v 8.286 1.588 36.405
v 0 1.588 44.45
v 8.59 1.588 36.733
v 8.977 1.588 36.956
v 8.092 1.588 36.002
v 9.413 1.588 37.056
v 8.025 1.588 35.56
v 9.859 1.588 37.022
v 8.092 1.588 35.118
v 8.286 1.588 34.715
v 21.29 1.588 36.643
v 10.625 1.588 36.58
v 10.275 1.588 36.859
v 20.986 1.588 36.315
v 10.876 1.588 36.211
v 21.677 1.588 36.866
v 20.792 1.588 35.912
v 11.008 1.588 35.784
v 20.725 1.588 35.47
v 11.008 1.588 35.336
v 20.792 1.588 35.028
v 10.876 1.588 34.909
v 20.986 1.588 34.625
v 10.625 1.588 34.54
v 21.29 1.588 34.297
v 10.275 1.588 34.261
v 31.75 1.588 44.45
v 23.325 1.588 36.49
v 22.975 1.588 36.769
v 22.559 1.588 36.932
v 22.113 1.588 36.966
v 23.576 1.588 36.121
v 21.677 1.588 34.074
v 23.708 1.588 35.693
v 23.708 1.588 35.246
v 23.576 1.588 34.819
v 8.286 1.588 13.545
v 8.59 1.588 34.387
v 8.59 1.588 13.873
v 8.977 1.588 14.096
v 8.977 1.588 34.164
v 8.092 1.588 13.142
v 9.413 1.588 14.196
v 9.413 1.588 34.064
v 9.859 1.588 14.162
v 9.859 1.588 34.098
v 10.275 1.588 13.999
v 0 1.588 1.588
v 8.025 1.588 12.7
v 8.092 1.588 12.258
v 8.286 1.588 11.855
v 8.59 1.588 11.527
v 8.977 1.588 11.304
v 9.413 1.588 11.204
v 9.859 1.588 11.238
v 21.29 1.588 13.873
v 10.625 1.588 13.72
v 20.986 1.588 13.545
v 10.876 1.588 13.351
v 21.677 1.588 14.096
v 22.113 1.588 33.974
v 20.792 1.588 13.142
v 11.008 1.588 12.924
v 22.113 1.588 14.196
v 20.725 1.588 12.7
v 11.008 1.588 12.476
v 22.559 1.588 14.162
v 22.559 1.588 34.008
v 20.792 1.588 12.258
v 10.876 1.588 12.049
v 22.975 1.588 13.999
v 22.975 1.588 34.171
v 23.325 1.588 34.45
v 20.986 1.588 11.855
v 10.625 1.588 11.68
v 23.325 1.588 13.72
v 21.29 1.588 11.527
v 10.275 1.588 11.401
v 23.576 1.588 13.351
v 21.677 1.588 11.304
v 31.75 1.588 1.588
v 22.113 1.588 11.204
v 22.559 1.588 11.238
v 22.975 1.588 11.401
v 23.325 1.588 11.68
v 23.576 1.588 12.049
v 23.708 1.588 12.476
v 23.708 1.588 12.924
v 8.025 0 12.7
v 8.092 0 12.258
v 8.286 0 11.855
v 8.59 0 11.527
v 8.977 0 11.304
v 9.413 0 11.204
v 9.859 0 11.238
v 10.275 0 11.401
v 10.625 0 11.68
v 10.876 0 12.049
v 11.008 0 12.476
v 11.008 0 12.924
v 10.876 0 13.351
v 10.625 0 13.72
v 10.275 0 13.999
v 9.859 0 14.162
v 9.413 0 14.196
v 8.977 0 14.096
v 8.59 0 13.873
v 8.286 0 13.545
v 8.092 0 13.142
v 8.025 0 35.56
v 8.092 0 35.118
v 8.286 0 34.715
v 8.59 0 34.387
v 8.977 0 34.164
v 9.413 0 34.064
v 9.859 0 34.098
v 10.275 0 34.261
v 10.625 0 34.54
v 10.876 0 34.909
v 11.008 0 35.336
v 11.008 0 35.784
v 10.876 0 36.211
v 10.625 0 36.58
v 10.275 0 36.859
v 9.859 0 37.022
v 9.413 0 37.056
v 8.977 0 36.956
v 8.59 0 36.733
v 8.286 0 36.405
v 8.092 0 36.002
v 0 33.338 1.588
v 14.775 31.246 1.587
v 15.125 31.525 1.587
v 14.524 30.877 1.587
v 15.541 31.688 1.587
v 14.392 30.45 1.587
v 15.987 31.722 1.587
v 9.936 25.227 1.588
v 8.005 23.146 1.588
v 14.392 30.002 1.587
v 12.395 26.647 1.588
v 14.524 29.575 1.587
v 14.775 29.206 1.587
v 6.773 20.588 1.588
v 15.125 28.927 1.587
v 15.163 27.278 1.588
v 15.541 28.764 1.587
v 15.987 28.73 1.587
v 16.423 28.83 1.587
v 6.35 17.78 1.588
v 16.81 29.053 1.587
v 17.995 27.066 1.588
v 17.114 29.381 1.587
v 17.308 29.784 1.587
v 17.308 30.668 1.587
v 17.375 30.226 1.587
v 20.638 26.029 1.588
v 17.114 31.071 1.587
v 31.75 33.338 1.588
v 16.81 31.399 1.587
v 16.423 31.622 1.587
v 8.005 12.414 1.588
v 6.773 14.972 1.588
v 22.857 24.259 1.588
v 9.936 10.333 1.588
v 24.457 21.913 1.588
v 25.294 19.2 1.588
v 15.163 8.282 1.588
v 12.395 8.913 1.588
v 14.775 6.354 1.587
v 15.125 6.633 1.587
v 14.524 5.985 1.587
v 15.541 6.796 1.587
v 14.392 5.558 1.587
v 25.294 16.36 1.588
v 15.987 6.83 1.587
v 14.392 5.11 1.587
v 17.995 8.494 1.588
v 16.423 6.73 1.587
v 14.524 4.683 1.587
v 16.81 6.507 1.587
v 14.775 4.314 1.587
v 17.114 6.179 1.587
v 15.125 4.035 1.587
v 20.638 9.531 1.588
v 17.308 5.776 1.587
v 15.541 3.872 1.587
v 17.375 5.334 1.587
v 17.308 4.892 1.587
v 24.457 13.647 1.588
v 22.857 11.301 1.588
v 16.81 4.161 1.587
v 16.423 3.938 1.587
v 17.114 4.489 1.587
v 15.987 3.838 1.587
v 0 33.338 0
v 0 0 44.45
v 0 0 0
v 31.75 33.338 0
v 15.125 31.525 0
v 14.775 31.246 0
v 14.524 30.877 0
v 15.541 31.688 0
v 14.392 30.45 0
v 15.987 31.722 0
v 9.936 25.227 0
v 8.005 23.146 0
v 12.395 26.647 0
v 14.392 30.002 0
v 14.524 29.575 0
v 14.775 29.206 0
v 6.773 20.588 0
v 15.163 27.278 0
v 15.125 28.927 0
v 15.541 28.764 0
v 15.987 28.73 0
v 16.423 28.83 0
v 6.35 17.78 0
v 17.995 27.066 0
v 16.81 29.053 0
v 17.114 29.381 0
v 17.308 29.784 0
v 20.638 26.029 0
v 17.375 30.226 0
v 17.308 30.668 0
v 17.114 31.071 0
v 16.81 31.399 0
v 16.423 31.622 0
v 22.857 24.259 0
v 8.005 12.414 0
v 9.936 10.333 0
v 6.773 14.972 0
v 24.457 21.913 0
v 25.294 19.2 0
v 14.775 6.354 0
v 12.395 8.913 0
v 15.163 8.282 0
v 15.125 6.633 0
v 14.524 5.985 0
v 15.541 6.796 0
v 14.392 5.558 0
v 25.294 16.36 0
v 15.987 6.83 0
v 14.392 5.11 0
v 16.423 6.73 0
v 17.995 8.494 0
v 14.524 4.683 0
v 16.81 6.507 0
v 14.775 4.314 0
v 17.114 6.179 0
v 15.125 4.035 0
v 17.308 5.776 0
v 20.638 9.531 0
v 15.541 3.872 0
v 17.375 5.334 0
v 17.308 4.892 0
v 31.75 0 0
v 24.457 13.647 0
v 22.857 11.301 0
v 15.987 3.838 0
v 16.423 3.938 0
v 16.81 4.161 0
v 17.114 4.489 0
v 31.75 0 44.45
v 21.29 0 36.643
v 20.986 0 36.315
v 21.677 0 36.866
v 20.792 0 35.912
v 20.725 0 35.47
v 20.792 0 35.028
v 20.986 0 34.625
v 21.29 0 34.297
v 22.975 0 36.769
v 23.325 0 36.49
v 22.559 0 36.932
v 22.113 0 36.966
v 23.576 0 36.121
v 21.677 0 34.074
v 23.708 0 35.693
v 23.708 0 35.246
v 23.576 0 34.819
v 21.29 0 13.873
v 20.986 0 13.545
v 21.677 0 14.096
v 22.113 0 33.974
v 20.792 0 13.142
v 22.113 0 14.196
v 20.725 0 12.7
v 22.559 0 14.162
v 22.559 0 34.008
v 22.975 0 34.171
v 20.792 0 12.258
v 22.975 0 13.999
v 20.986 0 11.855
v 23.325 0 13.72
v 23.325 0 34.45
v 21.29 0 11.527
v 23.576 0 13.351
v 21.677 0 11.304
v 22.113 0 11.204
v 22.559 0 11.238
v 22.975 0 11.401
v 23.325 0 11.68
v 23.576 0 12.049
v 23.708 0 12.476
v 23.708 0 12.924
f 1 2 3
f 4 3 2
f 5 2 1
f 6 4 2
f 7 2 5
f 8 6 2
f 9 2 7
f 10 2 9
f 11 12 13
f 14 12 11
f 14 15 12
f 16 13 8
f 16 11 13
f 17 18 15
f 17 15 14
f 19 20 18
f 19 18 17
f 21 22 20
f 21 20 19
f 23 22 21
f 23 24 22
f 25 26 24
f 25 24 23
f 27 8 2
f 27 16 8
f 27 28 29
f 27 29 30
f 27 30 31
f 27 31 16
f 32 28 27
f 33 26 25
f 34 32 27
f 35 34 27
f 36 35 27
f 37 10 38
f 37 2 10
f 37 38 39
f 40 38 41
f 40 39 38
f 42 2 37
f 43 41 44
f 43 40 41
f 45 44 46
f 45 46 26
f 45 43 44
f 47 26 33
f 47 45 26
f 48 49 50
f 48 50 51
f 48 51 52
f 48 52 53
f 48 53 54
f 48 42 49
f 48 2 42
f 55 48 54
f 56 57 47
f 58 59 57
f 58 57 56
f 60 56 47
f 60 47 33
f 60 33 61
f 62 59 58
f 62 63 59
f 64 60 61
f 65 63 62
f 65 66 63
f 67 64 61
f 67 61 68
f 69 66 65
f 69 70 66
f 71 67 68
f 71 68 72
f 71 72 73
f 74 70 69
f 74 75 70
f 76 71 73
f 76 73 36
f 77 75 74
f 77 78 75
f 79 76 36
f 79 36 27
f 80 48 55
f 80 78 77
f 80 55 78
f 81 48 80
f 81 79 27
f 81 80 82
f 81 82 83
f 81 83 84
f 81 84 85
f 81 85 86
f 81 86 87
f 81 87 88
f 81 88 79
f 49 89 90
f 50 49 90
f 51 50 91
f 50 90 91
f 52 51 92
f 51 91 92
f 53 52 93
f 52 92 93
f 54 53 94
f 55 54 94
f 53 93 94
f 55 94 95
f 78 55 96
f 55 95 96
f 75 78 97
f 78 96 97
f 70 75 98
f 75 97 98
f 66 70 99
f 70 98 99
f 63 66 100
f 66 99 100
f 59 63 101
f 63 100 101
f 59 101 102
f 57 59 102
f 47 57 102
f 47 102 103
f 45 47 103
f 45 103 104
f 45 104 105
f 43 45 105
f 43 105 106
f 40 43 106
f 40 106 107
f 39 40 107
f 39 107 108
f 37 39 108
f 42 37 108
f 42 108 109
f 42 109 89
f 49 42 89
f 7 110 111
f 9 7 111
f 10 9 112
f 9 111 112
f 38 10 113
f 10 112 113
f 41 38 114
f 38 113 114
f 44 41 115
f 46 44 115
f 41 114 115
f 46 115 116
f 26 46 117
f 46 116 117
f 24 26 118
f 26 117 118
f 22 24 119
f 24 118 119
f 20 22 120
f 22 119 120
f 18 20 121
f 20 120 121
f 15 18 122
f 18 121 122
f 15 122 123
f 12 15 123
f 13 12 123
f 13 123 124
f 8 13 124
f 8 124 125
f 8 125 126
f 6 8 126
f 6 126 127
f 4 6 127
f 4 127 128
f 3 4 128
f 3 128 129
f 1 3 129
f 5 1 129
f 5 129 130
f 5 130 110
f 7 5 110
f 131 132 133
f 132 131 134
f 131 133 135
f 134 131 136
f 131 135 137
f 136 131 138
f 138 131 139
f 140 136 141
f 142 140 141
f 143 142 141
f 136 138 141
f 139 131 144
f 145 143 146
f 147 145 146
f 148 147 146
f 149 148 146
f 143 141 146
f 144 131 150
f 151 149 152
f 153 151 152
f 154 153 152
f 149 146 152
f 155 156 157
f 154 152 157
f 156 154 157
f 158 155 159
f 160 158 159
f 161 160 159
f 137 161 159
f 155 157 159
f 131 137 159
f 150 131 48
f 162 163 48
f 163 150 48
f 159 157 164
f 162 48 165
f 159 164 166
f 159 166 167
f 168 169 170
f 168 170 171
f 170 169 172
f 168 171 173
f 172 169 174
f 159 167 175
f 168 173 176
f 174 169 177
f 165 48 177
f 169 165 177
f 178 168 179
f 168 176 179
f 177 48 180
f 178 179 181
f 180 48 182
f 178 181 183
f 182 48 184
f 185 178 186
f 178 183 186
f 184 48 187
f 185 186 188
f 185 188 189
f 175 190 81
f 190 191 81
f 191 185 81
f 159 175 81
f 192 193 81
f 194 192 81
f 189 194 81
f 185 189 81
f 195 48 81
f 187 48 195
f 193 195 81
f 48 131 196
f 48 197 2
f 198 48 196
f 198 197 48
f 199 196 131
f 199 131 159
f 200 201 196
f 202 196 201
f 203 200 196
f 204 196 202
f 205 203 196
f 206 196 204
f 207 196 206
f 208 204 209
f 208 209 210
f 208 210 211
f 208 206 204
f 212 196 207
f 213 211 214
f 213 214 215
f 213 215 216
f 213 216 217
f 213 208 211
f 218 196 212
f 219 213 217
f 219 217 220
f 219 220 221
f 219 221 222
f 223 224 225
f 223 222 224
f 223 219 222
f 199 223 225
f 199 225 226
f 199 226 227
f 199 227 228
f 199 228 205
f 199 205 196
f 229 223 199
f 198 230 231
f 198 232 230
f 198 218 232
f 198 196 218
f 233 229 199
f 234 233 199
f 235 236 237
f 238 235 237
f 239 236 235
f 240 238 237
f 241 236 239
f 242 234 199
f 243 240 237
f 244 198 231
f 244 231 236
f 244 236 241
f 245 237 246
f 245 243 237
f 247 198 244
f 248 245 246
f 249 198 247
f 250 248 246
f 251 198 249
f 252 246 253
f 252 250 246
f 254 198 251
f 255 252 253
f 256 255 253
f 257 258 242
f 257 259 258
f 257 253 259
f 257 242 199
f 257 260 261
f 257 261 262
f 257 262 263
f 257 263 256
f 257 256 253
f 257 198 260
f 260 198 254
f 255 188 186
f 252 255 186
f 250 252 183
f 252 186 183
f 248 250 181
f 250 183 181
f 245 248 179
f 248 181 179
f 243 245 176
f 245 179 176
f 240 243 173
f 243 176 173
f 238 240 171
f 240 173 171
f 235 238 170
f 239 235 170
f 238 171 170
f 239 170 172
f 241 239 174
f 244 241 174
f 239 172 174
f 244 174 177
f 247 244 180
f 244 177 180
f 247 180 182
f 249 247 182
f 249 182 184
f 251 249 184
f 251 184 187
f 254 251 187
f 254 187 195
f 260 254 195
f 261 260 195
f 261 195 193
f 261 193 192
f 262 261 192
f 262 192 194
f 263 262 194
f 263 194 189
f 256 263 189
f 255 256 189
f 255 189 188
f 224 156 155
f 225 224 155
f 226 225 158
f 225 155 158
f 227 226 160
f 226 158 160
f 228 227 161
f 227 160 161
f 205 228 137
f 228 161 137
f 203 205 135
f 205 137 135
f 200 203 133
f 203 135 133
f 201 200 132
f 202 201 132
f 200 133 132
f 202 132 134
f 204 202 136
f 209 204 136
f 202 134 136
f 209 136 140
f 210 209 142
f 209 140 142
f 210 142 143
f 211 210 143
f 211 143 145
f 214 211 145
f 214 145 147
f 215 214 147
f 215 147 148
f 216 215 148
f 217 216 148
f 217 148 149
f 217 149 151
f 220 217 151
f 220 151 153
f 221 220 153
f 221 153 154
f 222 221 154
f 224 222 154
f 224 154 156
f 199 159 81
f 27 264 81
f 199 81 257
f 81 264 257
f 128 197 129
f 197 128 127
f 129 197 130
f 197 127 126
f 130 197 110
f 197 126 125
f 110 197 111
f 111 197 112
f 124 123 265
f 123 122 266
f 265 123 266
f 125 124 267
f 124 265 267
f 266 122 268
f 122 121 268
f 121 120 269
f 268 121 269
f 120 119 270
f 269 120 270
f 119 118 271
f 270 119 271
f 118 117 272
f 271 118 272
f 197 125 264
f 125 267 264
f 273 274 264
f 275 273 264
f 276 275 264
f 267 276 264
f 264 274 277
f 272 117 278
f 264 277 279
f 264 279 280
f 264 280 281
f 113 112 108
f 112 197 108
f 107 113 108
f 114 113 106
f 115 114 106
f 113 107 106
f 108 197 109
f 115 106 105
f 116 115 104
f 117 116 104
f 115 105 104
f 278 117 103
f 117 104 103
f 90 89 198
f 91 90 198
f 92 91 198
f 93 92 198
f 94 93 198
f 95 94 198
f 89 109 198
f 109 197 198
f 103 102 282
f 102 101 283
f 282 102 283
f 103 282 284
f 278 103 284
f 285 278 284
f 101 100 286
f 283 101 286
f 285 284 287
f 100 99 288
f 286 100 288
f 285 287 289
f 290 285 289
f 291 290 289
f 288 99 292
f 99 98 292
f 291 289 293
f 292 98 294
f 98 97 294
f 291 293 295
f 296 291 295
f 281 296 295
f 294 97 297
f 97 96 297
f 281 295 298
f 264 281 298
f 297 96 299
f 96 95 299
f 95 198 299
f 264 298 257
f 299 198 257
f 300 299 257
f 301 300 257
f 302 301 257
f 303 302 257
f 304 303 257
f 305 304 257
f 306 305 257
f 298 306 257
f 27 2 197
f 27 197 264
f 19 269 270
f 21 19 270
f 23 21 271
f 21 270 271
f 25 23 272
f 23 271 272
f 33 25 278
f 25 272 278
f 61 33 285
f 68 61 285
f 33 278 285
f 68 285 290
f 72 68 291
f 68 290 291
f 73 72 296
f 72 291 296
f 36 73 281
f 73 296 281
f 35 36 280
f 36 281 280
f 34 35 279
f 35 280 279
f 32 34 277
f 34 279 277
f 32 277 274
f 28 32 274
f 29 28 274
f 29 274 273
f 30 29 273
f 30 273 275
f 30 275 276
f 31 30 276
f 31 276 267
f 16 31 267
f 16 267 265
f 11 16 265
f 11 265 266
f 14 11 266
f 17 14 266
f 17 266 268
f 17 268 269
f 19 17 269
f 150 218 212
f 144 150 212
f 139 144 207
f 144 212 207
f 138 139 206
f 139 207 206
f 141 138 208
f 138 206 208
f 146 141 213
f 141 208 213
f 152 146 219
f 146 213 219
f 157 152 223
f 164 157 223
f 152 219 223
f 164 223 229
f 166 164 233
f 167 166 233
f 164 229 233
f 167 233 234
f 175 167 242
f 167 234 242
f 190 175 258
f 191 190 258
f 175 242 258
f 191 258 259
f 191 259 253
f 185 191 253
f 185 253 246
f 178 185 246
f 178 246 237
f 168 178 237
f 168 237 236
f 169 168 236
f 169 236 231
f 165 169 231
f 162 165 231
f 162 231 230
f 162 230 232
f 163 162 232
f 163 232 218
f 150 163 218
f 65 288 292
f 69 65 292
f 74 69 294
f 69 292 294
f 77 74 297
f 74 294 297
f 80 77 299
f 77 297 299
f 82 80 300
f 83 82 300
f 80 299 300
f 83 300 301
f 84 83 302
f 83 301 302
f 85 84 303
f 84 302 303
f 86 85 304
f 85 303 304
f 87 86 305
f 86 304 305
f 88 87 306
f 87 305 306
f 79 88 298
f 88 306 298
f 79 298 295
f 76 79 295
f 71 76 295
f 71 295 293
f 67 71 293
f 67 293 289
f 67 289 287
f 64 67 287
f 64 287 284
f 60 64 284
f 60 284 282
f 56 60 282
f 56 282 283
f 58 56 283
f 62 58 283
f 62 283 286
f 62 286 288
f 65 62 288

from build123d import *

# Parameters (mm, degrees)
SKETCH1_W                    = 31.75
SKETCH1_H                    = 1.5875
BOSS_EXTRUDE1_DEPTH          = 44.45
SKETCH2_W                    = 31.75
SKETCH2_H                    = 1.5875
BOSS_EXTRUDE2_DEPTH          = 31.75
SKETCH3_R                    = 9.525
CUT_EXTRUDE1_DEPTH           = 64.994170877
F_3_0_3_DIAMETER_HOLE1_D     = 3
F_3_0_3_DIAMETER_HOLE1_DEPTH = 3.556
F_3_0_3_DIAMETER_HOLE1_TIP   = 0.901290929
F_3_0_3_DIAMETER_HOLE2_D     = 3
F_3_0_3_DIAMETER_HOLE2_DEPTH = 3.556
F_3_0_3_DIAMETER_HOLE2_TIP   = 0.901290929


with BuildPart() as part:
    # Sketch1 → Boss-Extrude1 (new body)
    with BuildSketch(Plane.XY):
        with Locations((15.875, 0.79375)):
            Rectangle(SKETCH1_W, SKETCH1_H)
    extrude(amount=BOSS_EXTRUDE1_DEPTH)

    # Sketch2 → Boss-Extrude2 (add)
    with BuildSketch(Plane(origin=(0, 1.5875, 0), x_dir=(1, 0, 0), z_dir=(0, 1, 0))):
        with Locations((15.875, -0.79375)):
            Rectangle(SKETCH2_W, SKETCH2_H)
    extrude(amount=BOSS_EXTRUDE2_DEPTH)

    # Sketch3 → Cut-Extrude1 (cut, through all)
    with BuildSketch(Plane(origin=(0, 0, 0), x_dir=(-1, 0, 0), z_dir=(0, 0, -1))):
        with Locations((-15.875, 17.78)):
            Circle(SKETCH3_R)
    extrude(amount=-CUT_EXTRUDE1_DEPTH, mode=Mode.SUBTRACT)

    # Ø3.0 (3) Diameter Hole1
    with Locations(Plane(origin=(0, 0, 0), x_dir=(-1, 0, 0), z_dir=(0, 0, -1))):
        with Locations((-15.875, 30.226), (-15.875, 5.334)):
            Hole(F_3_0_3_DIAMETER_HOLE1_D / 2, depth=F_3_0_3_DIAMETER_HOLE1_DEPTH)
            with Locations((0, 0, -(F_3_0_3_DIAMETER_HOLE1_DEPTH + F_3_0_3_DIAMETER_HOLE1_TIP / 2))):  # 118° drill point
                Cone(0, F_3_0_3_DIAMETER_HOLE1_D / 2, F_3_0_3_DIAMETER_HOLE1_TIP, mode=Mode.SUBTRACT)

    # Ø3.0 (3) Diameter Hole2
    with Locations(Plane(origin=(0, 1.5875, 0), x_dir=(1, 0, 0), z_dir=(0, 1, 0))):
        with Locations((22.225, -12.7), (22.225, -35.469930371), (9.525, -12.7), (9.525, -35.56)):
            Hole(F_3_0_3_DIAMETER_HOLE2_D / 2, depth=F_3_0_3_DIAMETER_HOLE2_DEPTH)
            with Locations((0, 0, -(F_3_0_3_DIAMETER_HOLE2_DEPTH + F_3_0_3_DIAMETER_HOLE2_TIP / 2))):  # 118° drill point
                Cone(0, F_3_0_3_DIAMETER_HOLE2_D / 2, F_3_0_3_DIAMETER_HOLE2_TIP, mode=Mode.SUBTRACT)


solid = part.part
